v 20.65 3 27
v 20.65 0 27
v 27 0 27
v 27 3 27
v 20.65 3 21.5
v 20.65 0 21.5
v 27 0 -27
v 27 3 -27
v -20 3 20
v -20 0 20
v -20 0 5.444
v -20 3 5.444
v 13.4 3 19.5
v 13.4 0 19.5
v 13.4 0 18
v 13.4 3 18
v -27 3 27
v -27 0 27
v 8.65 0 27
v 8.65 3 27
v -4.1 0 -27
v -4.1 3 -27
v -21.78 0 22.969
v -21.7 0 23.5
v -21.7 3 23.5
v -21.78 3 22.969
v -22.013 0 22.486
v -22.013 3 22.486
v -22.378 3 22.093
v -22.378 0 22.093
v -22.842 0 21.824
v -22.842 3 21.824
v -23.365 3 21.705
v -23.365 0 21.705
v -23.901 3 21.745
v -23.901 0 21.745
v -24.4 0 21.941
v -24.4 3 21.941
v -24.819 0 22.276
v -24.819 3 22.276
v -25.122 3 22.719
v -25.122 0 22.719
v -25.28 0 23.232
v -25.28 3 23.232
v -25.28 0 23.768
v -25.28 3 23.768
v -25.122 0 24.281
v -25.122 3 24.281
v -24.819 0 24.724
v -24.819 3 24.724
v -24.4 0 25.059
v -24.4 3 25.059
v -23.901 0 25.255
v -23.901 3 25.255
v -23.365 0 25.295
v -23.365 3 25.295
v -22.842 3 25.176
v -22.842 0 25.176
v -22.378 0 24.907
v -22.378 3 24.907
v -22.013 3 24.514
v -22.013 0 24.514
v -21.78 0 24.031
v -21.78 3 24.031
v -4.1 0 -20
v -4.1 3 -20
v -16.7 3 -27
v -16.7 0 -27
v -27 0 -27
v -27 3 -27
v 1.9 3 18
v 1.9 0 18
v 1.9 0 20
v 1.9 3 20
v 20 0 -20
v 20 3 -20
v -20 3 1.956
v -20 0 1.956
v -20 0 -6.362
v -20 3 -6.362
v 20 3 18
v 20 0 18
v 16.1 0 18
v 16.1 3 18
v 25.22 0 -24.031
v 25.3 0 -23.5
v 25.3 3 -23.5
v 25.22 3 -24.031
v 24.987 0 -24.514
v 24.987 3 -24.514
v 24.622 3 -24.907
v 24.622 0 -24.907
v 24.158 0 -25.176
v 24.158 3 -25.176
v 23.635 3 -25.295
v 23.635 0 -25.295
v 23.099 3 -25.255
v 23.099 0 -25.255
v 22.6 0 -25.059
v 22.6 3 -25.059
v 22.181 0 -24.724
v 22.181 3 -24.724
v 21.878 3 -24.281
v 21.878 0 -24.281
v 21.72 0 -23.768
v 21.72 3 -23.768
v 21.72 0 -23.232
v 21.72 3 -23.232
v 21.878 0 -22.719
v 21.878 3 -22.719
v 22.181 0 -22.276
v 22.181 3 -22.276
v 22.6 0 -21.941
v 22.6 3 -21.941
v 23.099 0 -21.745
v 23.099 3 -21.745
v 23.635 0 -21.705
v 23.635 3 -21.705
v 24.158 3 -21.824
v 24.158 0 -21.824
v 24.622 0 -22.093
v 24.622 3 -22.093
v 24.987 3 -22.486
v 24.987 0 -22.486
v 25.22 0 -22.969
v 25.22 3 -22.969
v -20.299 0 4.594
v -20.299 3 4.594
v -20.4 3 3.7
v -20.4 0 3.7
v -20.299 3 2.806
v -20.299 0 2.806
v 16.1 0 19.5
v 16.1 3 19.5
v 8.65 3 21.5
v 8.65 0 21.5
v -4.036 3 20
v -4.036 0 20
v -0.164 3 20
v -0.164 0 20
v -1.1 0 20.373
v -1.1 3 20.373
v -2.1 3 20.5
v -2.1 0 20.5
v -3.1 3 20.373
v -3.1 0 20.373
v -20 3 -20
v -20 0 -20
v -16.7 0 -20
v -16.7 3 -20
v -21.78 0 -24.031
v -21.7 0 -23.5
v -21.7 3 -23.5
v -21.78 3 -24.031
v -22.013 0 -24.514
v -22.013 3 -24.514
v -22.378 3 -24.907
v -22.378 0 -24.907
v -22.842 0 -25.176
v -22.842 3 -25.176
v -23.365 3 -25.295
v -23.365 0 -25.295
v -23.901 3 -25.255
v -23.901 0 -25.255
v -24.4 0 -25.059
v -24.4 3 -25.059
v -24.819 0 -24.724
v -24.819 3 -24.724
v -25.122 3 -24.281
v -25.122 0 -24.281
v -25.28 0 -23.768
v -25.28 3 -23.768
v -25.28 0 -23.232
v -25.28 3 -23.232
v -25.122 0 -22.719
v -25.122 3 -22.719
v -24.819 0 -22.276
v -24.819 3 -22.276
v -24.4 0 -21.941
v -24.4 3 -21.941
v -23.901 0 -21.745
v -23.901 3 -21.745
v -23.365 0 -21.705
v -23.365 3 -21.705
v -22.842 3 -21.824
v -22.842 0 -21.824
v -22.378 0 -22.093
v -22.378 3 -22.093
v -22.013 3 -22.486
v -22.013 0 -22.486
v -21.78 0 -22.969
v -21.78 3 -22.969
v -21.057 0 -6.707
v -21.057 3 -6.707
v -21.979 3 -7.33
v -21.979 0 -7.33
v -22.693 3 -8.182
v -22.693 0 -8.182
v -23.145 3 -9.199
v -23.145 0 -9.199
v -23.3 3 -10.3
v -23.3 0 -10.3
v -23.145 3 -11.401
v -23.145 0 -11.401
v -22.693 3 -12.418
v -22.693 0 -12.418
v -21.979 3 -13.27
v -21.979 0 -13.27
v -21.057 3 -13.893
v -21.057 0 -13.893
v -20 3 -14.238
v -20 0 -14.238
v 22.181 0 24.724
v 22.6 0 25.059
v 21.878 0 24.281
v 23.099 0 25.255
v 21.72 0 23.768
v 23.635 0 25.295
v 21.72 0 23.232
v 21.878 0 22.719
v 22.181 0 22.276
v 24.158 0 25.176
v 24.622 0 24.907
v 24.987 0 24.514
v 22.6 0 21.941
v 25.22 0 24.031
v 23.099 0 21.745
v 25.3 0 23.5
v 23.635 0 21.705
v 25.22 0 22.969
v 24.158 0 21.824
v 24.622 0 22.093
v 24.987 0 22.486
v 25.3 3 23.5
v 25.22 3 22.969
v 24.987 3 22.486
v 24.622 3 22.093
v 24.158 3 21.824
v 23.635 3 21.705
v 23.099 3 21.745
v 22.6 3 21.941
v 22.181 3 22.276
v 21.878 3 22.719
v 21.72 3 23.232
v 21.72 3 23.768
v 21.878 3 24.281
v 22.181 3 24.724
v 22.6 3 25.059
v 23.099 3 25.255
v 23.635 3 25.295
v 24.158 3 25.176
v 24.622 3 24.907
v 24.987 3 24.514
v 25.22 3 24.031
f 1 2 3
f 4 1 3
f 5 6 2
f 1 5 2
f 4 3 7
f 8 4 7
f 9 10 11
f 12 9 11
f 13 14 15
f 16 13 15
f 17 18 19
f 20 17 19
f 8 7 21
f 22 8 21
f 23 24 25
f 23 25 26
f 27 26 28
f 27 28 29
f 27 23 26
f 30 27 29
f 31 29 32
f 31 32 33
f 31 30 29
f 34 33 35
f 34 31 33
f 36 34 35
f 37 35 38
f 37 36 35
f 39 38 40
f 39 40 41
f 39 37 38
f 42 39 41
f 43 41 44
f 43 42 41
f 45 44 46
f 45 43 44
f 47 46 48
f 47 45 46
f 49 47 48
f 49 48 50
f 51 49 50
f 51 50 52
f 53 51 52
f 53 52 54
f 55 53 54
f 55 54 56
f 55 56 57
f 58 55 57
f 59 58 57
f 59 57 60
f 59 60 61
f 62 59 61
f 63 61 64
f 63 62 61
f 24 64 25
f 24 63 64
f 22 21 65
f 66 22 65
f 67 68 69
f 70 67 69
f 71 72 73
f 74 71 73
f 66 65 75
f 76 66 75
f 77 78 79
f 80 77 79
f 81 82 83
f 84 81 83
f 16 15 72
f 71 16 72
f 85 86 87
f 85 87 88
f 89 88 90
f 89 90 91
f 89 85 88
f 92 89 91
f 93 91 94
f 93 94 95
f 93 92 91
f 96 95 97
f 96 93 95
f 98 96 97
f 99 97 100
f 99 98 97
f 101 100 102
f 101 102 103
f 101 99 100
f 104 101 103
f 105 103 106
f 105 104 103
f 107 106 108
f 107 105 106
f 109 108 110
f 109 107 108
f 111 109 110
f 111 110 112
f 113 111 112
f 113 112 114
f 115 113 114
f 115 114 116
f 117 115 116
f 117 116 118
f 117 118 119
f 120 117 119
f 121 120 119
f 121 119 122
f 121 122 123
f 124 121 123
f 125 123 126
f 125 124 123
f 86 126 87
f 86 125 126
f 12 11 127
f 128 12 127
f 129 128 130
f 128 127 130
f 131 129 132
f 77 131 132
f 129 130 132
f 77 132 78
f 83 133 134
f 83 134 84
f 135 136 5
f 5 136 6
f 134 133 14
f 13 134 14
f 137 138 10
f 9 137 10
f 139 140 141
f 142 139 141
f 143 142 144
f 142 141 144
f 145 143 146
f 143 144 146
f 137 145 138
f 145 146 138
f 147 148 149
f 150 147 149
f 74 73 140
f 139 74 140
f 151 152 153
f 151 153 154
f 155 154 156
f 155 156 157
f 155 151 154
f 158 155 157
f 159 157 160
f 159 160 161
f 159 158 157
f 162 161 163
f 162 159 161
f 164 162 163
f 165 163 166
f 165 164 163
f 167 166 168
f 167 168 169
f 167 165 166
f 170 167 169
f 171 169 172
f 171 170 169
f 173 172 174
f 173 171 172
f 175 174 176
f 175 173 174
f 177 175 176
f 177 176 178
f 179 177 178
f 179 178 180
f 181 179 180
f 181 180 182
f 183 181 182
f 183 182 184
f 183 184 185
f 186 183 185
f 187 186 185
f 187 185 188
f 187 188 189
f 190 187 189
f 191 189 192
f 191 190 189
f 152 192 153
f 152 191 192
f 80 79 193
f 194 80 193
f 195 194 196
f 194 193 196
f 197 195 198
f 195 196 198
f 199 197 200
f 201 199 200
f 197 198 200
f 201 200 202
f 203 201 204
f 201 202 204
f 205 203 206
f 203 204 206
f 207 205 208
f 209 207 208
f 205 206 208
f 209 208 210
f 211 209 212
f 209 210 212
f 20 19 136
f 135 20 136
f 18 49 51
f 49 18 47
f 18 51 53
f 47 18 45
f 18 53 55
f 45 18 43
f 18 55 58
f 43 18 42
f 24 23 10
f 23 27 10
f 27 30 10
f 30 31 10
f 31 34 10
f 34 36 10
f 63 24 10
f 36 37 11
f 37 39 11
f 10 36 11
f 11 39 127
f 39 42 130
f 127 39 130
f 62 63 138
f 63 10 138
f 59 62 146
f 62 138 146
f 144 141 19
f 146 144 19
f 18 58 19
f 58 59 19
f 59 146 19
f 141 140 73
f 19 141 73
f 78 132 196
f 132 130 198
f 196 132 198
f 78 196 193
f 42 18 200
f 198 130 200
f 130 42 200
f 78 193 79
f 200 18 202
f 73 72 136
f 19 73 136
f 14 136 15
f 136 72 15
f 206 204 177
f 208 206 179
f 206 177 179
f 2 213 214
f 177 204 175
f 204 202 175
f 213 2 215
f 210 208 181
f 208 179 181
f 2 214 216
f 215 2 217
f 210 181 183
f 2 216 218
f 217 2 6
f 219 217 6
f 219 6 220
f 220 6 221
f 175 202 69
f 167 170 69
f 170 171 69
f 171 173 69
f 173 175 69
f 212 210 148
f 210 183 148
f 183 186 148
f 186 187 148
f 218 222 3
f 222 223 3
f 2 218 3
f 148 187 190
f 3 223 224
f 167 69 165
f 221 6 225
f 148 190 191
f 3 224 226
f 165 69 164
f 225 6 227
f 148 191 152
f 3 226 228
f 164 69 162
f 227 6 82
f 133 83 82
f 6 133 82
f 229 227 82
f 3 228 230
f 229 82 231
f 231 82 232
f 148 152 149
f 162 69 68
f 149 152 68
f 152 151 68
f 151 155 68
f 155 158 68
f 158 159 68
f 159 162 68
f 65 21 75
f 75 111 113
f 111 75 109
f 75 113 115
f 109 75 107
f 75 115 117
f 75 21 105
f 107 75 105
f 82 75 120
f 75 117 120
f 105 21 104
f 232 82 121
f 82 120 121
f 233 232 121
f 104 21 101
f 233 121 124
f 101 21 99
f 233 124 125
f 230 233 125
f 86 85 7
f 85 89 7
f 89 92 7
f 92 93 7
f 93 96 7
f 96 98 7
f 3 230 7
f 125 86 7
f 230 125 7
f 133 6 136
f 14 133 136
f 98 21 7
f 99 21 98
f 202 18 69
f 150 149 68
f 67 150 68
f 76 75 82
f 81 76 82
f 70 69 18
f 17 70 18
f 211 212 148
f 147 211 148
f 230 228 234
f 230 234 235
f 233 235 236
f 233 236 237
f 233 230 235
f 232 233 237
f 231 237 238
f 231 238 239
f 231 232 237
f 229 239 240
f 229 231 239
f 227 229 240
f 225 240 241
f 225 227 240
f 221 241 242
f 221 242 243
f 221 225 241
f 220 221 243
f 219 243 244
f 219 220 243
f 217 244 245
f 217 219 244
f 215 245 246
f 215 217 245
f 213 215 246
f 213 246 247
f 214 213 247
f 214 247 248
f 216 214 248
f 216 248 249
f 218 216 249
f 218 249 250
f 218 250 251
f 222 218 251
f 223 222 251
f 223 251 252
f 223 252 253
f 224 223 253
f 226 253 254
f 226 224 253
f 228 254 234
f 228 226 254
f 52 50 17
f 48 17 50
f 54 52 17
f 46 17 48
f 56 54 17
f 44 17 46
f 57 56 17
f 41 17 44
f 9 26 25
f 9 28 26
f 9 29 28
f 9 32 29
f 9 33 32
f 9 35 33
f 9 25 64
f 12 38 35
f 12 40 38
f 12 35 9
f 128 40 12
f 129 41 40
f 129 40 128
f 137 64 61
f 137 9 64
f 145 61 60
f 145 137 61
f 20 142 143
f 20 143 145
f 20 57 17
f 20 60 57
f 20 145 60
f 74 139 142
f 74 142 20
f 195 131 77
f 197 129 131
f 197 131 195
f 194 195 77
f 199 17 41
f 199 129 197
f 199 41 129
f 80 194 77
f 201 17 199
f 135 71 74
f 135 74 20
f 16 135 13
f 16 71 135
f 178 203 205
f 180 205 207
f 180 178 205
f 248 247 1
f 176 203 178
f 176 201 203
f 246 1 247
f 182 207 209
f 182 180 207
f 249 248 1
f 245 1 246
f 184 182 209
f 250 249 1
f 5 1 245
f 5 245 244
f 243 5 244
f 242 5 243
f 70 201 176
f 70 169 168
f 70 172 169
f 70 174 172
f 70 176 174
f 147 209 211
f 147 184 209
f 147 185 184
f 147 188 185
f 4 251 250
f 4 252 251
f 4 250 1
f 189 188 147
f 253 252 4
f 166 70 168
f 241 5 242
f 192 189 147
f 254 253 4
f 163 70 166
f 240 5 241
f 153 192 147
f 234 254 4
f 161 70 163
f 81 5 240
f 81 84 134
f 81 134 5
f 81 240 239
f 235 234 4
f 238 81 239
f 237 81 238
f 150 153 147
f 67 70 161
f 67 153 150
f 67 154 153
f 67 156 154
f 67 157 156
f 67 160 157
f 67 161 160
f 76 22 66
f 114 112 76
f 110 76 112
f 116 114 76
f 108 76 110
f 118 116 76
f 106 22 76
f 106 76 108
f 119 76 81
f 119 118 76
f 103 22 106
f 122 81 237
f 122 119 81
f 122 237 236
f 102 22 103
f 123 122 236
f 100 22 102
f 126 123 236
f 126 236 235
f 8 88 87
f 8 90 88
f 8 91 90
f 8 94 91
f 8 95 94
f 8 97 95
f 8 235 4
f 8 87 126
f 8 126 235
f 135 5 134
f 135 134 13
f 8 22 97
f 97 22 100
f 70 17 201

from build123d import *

# Parameters (mm, degrees)
SKETCH_3_R      = 1.8
SKETCH_3_W      = 0.8
SKETCH_3_H      = 1.5
SKETCH_3_W_2    = 1
EXTRUDE_2_DEPTH = 3


with BuildPart() as part:
    # 草图3 → 凸台-拉伸2 (new body)
    with BuildSketch(Plane(origin=(0, 0, 0), x_dir=(1, 0, 0), z_dir=(0, 1, 0))):
        with BuildLine():
            Line((8.65, -27), (8.65, -21.5))
            Line((8.65, -21.5), (8.65, -20))
            Line((8.65, -20), (1.9, -20))
            Line((1.9, -20), (-0.163508327, -20))
            ThreePointArc((-0.163508327, -20), (-2.1, -20.5), (-4.036491673, -20))
            Line((-4.036491673, -20), (-20, -20))
            Line((-20, -20), (-20, -5.443559577))
            ThreePointArc((-20, -5.443559577), (-20.4, -3.7), (-20, -1.956440423))
            Line((-20, -1.956440423), (-20, 6.361726266))
            ThreePointArc((-20, 6.361726266), (-23.3, 10.3), (-20, 14.238273734))
            Line((-20, 14.238273734), (-20, 20))
            Line((-20, 20), (-16.7, 20))
            Line((-16.7, 20), (-16.7, 27))
            Line((-16.7, 27), (-27, 27))
            Line((-27, 27), (-27, -27))
            Line((-27, -27), (8.65, -27))
        make_face()
        with Locations((-23.5, -23.5)):
            Circle(SKETCH_3_R, mode=Mode.SUBTRACT)
        with Locations((-23.5, 23.5)):
            Circle(SKETCH_3_R, mode=Mode.SUBTRACT)
        Polygon((20, -18), (20, -20), (20.65, -20), (20.65, -21.5), (20.65, -27), (27, -27), (27, 27), (-4.1, 27), (-4.1, 20), (20, 20), align=None)
        with Locations((23.5, -23.5)):
            Circle(SKETCH_3_R, mode=Mode.SUBTRACT)
        with Locations((23.5, 23.5)):
            Circle(SKETCH_3_R, mode=Mode.SUBTRACT)
        Polygon((12.4, -20), (12.4, -19.5), (12.4, -18), (1.9, -18), (1.9, -20), (8.65, -20), align=None)
        Polygon((20, -20), (16.9, -20), (16.9, -19.5), (16.1, -19.5), (13.4, -19.5), (12.4, -19.5), (12.4, -20), (8.65, -20), (8.65, -21.5), (20.65, -21.5), (20.65, -20), align=None)
        Polygon((16.9, -19.5), (16.9, -20), (20, -20), (20, -18), (16.9, -18), align=None)
        with Locations((16.5, -18.75)):
            Rectangle(SKETCH_3_W, SKETCH_3_H)
        with Locations((12.9, -18.75)):
            Rectangle(SKETCH_3_W_2, SKETCH_3_H)
    extrude(amount=EXTRUDE_2_DEPTH)


solid = part.part
